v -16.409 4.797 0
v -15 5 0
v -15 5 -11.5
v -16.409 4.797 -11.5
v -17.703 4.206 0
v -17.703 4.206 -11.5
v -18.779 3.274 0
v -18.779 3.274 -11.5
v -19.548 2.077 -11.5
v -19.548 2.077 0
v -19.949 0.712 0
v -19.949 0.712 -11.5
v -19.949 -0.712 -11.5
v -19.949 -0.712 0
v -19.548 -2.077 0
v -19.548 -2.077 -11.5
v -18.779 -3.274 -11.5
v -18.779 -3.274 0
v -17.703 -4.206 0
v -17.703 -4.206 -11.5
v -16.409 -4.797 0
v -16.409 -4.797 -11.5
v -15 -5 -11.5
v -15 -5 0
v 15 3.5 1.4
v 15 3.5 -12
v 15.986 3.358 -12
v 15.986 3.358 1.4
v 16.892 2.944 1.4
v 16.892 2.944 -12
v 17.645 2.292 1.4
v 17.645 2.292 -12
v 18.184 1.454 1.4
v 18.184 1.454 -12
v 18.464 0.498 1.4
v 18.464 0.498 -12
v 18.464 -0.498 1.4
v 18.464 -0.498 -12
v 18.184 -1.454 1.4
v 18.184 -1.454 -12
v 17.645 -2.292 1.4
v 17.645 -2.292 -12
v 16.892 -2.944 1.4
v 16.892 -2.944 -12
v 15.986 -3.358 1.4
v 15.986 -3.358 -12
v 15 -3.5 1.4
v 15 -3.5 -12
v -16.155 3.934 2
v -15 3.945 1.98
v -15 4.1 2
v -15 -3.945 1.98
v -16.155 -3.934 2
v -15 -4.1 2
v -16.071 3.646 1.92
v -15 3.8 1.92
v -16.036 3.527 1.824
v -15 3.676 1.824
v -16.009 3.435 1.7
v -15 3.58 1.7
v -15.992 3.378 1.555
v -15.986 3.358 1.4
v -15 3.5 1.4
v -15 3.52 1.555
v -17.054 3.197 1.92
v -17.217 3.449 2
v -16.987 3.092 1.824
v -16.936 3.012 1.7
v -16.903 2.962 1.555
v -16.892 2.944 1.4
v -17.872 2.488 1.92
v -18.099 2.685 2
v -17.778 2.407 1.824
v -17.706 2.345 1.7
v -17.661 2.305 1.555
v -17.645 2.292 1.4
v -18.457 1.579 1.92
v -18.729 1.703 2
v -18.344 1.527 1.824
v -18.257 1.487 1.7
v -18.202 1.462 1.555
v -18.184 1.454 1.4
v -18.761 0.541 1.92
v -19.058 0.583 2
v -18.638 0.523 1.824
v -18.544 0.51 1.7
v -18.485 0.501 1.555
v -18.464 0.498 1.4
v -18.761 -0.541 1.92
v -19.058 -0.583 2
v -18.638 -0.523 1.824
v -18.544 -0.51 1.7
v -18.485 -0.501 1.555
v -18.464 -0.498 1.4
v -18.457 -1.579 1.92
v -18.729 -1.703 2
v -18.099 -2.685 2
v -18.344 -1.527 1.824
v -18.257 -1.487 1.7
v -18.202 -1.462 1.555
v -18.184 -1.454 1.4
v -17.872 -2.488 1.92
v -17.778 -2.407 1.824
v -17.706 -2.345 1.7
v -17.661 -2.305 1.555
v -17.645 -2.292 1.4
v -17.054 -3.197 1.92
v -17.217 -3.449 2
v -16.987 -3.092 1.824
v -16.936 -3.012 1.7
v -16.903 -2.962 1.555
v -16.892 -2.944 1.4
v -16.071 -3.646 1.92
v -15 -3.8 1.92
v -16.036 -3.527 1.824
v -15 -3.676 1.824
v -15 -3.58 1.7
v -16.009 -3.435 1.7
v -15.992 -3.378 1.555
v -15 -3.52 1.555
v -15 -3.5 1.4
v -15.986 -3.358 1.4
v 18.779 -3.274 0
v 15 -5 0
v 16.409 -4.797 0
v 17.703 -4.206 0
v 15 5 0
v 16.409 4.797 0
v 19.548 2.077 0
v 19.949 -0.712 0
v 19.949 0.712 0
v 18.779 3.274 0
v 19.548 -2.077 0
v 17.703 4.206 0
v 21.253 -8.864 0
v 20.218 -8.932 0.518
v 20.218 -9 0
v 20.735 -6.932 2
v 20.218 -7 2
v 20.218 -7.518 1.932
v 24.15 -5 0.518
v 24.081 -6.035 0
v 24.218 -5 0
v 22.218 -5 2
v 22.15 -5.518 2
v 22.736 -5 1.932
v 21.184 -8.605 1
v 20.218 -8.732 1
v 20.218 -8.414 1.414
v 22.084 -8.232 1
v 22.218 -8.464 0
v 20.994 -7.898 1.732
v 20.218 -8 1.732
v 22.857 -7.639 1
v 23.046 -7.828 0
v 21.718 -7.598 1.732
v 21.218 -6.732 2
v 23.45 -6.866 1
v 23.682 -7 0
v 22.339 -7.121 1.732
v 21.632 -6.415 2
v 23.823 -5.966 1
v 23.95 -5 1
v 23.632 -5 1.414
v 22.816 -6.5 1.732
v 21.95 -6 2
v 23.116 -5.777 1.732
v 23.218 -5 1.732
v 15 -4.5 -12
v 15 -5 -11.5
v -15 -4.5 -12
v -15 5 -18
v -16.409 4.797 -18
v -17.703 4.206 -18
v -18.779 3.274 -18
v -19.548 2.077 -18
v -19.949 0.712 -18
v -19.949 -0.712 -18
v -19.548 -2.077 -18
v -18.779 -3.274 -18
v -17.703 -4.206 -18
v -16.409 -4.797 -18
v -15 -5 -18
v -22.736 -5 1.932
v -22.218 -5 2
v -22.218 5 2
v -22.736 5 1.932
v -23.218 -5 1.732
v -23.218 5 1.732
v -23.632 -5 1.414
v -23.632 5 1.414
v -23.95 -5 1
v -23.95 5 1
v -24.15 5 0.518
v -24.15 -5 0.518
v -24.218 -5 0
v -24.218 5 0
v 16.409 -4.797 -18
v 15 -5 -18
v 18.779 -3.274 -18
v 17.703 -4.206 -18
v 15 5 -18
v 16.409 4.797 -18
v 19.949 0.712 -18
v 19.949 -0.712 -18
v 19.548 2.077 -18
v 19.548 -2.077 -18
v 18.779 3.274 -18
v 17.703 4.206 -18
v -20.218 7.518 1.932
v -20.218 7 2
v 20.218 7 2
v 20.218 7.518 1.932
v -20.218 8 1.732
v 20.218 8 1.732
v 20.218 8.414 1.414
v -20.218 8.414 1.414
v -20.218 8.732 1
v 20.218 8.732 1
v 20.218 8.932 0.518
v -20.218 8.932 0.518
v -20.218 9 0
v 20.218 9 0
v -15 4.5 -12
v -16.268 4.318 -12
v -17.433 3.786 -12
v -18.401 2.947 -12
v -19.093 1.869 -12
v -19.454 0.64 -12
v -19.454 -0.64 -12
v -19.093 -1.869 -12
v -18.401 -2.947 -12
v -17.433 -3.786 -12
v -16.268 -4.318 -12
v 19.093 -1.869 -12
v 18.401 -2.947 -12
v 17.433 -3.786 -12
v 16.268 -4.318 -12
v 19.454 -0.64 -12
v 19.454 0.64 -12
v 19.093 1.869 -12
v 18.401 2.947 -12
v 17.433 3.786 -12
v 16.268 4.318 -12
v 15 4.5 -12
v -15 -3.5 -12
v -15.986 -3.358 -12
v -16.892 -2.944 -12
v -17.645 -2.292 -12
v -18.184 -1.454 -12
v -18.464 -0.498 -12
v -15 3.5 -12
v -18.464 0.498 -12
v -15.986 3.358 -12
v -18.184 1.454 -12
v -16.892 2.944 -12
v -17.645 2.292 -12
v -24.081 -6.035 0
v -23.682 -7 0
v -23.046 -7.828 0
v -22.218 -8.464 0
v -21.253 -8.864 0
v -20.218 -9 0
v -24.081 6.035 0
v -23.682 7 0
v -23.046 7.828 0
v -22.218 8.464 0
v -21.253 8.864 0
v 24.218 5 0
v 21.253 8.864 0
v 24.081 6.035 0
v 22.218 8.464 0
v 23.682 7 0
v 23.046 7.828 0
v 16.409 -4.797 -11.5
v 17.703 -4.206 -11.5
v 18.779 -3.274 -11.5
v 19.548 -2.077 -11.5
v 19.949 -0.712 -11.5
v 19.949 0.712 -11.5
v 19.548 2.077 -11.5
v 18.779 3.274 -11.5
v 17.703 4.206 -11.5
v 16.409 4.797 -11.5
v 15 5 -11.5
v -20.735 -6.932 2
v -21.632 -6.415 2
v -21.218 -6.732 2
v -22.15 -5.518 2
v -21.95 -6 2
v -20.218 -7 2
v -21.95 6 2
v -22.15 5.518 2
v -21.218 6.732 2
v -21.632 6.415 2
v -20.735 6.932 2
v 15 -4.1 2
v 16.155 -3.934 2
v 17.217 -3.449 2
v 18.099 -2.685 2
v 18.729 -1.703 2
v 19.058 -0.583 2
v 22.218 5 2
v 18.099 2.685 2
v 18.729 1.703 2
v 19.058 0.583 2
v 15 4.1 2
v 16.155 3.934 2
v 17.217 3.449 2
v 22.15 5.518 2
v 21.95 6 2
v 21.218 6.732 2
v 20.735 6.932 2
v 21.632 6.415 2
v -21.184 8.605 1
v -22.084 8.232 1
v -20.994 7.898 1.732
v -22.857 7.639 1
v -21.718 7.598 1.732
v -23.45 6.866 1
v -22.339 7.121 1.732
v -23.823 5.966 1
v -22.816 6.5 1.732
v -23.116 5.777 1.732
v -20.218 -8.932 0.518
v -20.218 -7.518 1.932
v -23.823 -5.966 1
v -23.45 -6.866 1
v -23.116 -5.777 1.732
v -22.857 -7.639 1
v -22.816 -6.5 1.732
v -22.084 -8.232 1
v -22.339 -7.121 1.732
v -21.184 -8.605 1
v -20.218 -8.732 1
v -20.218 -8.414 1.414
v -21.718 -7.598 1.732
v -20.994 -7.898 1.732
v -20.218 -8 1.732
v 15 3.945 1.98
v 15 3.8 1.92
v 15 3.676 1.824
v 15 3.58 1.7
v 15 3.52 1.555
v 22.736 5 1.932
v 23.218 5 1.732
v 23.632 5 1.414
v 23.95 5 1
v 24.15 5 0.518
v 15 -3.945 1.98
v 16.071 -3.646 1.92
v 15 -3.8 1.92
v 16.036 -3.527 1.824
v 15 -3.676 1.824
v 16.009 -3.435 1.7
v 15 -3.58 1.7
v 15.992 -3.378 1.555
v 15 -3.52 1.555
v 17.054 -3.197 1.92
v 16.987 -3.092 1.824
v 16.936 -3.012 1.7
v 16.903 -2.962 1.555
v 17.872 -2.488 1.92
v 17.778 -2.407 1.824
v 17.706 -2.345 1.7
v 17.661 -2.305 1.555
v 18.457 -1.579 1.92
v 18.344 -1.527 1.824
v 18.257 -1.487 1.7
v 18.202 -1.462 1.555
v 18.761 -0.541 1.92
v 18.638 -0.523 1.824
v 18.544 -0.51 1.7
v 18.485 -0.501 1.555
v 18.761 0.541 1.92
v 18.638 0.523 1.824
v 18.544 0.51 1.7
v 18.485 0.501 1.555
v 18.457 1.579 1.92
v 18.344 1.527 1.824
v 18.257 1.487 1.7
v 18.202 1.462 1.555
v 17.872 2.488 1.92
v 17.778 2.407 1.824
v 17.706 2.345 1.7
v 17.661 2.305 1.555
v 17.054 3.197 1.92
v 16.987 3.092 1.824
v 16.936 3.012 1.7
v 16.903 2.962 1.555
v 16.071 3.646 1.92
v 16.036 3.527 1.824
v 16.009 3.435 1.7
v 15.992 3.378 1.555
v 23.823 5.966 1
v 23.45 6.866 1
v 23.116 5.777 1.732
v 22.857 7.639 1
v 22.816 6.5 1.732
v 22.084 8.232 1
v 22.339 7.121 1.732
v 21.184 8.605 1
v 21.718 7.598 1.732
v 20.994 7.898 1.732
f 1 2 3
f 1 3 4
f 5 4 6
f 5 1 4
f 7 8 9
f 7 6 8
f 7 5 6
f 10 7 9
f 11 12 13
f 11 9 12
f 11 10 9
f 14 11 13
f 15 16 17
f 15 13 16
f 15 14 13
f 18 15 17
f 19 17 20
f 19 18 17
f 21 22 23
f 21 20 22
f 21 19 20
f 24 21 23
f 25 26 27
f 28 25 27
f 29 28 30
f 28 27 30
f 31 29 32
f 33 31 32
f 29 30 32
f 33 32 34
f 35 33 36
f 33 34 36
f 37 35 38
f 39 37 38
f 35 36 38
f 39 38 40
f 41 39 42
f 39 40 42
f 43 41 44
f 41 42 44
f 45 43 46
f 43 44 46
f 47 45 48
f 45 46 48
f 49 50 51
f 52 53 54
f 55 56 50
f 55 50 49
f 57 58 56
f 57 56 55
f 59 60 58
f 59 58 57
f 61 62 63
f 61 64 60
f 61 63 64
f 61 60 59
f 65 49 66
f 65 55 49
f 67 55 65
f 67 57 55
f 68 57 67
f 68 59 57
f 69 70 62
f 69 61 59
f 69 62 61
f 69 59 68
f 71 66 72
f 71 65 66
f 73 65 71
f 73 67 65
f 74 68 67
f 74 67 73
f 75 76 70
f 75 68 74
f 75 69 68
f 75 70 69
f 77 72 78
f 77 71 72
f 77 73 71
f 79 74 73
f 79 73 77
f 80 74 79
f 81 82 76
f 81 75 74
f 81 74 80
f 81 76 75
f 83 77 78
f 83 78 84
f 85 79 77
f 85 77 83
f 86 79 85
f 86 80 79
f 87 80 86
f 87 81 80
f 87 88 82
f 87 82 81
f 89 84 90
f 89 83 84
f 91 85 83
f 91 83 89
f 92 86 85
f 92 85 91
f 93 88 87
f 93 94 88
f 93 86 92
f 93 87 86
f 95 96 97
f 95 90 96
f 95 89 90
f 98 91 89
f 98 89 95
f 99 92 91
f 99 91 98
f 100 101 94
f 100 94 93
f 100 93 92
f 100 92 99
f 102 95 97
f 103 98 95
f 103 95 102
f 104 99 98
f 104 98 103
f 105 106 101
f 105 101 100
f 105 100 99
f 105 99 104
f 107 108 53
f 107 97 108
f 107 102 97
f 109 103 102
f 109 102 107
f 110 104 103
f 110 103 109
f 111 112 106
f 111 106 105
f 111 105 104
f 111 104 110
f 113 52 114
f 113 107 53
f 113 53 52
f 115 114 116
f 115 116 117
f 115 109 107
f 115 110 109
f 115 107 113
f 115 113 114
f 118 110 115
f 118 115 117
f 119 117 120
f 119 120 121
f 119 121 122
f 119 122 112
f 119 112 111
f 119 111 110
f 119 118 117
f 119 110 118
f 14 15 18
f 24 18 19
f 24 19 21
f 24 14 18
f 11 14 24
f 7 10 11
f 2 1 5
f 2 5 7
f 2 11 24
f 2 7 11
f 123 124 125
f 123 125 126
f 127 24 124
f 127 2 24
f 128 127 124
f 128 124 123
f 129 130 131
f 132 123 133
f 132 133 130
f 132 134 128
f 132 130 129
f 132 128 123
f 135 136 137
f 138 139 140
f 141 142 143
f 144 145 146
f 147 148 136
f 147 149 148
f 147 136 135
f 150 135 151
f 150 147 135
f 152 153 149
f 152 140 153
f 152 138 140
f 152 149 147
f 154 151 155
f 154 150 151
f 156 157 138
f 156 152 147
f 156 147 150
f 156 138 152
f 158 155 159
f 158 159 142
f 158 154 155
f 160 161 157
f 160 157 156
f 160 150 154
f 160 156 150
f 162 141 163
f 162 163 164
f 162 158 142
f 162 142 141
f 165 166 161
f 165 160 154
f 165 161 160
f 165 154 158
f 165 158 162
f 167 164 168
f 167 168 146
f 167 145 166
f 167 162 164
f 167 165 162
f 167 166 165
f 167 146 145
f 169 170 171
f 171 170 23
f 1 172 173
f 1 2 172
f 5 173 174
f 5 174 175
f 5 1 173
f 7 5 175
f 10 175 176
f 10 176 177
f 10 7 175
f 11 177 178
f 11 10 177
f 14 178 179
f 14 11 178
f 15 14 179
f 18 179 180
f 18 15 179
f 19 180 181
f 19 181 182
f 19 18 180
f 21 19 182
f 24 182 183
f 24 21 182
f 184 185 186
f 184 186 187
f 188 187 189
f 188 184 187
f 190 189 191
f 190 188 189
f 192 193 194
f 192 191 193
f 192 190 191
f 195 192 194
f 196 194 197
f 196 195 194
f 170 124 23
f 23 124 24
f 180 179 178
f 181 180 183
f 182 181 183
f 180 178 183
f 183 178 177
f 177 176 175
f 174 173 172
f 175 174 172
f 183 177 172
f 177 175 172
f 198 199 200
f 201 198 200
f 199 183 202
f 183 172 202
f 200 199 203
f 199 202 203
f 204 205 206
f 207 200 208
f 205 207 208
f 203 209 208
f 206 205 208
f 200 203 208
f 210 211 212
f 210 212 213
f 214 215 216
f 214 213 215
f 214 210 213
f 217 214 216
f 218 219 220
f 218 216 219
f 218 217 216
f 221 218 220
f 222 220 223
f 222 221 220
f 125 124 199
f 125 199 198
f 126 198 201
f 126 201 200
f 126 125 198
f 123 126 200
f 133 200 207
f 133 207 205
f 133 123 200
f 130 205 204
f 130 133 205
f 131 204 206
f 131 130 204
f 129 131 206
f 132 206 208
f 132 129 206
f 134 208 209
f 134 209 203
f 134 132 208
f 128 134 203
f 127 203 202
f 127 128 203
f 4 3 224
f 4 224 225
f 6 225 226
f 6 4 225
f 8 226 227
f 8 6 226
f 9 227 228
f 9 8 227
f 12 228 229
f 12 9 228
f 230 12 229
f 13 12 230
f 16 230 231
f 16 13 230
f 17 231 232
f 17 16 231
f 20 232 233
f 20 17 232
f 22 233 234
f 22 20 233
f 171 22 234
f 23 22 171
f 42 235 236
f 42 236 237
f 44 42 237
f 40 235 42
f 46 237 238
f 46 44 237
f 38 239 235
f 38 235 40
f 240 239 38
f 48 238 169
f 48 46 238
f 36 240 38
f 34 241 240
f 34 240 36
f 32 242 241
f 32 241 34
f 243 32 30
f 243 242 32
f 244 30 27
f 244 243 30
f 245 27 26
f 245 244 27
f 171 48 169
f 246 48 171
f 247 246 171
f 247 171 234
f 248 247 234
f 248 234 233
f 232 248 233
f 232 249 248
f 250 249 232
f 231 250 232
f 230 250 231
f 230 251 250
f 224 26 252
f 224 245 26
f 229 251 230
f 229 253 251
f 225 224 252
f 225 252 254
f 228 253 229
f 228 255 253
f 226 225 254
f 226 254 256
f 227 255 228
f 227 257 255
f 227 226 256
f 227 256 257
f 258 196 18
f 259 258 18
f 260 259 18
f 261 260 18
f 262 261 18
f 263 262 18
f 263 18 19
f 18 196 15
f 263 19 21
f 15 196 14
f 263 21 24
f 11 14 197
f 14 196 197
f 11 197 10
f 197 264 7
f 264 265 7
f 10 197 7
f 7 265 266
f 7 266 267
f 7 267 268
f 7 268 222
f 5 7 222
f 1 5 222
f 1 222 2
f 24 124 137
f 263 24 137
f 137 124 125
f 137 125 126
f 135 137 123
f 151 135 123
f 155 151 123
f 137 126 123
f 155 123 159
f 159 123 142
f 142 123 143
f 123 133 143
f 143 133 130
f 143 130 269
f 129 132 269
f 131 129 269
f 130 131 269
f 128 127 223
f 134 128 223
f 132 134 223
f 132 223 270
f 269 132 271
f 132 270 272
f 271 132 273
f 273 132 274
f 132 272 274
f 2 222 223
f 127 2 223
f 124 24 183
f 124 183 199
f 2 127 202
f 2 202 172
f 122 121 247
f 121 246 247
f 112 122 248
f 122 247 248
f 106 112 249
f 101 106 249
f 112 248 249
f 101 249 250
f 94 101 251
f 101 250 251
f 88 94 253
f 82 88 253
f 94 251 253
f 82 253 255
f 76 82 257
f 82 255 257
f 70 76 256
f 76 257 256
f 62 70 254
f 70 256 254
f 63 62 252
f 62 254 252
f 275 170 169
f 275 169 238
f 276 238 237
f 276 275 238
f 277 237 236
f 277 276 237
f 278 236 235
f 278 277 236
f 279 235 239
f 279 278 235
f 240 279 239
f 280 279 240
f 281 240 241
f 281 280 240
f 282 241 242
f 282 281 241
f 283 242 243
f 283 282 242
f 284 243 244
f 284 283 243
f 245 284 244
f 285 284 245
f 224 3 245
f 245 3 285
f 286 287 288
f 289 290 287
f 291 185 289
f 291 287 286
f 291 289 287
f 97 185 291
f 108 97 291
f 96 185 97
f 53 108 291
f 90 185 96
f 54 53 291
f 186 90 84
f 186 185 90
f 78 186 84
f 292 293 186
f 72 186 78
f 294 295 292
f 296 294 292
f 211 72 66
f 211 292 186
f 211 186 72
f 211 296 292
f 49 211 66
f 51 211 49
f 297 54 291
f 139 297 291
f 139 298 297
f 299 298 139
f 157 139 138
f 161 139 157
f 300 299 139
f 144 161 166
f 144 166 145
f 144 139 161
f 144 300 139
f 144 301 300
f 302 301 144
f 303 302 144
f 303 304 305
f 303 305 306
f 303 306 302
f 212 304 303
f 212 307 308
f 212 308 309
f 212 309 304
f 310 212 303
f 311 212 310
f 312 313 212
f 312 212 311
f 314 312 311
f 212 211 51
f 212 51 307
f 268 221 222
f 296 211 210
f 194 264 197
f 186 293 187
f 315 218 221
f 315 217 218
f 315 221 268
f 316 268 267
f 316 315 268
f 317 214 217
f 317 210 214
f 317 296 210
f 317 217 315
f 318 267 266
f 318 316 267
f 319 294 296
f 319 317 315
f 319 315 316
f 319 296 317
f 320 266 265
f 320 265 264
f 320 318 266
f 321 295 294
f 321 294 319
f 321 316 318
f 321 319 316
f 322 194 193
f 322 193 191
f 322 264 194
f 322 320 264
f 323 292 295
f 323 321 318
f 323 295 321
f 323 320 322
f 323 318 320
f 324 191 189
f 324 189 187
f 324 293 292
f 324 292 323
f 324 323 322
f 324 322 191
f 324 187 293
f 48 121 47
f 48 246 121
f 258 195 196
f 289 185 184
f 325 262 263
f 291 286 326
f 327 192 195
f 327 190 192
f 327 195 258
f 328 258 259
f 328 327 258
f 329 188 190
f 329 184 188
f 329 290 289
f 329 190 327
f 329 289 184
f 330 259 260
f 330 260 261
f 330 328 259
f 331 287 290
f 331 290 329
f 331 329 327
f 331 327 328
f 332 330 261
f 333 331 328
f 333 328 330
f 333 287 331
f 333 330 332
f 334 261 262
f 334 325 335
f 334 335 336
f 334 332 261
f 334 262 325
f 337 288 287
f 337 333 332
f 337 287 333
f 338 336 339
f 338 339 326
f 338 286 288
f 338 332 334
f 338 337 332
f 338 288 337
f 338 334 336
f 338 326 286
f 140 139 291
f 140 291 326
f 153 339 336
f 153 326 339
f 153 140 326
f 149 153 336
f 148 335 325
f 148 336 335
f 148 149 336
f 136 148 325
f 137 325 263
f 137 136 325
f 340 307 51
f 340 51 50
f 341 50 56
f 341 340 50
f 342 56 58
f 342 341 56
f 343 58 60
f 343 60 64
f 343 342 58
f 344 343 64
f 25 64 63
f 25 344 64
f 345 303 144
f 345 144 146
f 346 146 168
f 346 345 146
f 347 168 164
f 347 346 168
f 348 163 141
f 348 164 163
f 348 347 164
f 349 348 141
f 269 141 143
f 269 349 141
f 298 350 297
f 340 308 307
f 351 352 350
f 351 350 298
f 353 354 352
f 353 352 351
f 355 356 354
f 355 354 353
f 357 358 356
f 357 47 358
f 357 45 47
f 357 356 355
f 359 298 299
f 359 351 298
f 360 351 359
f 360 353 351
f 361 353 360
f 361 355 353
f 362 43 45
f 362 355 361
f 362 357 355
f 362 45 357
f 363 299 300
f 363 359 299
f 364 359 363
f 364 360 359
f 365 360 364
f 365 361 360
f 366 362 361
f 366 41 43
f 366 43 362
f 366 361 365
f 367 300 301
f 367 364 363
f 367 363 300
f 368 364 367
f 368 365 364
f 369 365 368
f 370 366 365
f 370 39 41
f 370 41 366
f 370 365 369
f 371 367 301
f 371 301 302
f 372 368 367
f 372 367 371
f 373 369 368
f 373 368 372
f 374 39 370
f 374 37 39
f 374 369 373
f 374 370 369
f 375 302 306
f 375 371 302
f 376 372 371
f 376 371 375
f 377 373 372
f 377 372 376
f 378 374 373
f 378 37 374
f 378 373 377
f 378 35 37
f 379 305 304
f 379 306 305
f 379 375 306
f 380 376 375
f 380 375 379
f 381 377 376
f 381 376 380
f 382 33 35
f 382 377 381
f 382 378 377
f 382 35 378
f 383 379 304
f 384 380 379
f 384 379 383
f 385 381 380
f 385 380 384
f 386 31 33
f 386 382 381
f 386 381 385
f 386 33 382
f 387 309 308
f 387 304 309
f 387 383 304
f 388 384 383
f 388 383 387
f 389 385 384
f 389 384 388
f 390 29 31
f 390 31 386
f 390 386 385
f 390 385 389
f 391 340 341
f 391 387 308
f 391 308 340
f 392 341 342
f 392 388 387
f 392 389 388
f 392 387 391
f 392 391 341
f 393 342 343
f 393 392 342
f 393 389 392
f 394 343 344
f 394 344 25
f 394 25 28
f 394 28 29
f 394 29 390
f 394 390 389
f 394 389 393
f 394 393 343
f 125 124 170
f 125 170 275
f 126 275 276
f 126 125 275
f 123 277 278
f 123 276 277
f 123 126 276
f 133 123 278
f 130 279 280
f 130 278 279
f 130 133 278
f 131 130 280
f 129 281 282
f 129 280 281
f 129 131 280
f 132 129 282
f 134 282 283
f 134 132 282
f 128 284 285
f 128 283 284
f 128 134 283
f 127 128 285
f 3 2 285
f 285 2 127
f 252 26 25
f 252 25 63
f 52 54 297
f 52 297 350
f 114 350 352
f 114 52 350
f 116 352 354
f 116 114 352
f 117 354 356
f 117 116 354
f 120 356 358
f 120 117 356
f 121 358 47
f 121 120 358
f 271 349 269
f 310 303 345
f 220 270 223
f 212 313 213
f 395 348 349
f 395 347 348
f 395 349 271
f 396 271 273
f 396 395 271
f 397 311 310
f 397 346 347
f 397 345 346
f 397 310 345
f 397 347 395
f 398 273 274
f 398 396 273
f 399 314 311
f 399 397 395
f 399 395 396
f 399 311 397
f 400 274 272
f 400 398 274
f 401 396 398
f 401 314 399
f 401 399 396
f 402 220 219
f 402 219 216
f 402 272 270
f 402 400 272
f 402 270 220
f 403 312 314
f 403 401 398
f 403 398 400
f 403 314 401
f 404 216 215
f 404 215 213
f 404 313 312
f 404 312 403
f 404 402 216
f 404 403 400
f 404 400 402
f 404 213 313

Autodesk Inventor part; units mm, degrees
ref_plane "YZ Plane" through (0, 0, 0) normal (1, 0, 0) x (0, 1, 0)
ref_plane "XZ Plane" through (0, 0, 0) normal (0, 1, 0) x (-1, 0, 0)
ref_plane "XY Plane" through (0, 0, 0) normal (0, 0, 1) x (1, 0, 0)
sketch "Sketch1" plane through (0, 0, 0) normal (0, 0, 1) x (1, 0, 0)
  line L0 (-15, 0) -> (15, 0) construction
  line L1 (-15, -5) -> (15, -5)
  line L2 (15, 5) -> (-15, 5)
  arc A0 (-15, 5) -> (-15, -5) centre (-15, 0) ccw
  arc A1 (15, -5) -> (15, 5) centre (15, 0) ccw
  line L3 (-20, -5) -> (20, -5) construction
  line L4 (20, -5) -> (20, 5) construction
  line L5 (20, 5) -> (-20, 5) construction
  line L6 (-20, 5) -> (-20, -5) construction
  line L7 (-20, -5) -> (20, 5) construction
  line L8 (20, -5) -> (-20, 5) construction
  point P0 (0, 0)
  dimension "d1" = 10
  dimension "Length" = 40
extrude "Extrusion1" add sketch "Sketch1" against normal blind 18
sketch "Sketch2" plane through (0, 0, 0) normal (0, 0, 1) x (1, 0, 0)
  line L0 (-24.2177, -9) -> (24.2177, -9)
  line L1 (24.2177, -9) -> (24.2177, 9)
  line L2 (24.2177, 9) -> (-24.2177, 9)
  line L3 (-24.2177, 9) -> (-24.2177, -9)
  line L4 (-24.2177, -9) -> (24.2177, 9) construction
  line L5 (24.2177, -9) -> (-24.2177, 9) construction
  line L6 (15, 5) -> (-15, 5) projected
  line L7 (-20, 5.8694) -> (-20, -5.995) construction
  arc A0 (-15, 5) -> (-15, -5) centre (-15, 0) ccw projected
  point P0 (0, 0)
  dimension "d4" = 4
  dimension "d5" = 4.2177
extrude "Extrusion2" add sketch "Sketch2" along normal blind 2 separate body
sketch "Sketch3" plane through (0, 0, 0) normal (0, 0, -1) x (-1, 0, 0)
  arc A0 (-15, 5) -> (-15, -5) centre (-15, 0) ccw projected
  line L0 (-15, -5) -> (15, -5) projected
  arc A1 (15, -5) -> (15, 5) centre (15, 0) ccw projected
  line L1 (15, 5) -> (-15, 5) projected
  point P0 (0, 0)
extrude "Extrusion3" add sketch "Sketch3" along normal blind 12 bodies 2
sketch "Sketch4" plane through (0, 0, -12) normal (0, 0, -1) x (-1, 0, 0)
  line L0 (-15, -5) -> (15, -5) projected
  arc A0 (15, -5) -> (15, 5) centre (15, 0) ccw projected
  line L1 (15, 5) -> (-15, 5) projected
  arc A1 (-15, 5) -> (-15, -5) centre (-15, 0) ccw projected
  line L2 (15, -3.5) -> (-15, -3.5)
  arc A2 (-15, 3.5) -> (-15, -3.5) centre (-15, 0) ccw
  line L3 (-15, 3.5) -> (15, 3.5)
  arc A3 (15, -3.5) -> (15, 3.5) centre (15, 0) ccw
  point P0 (0, 0)
  dimension "d10" = 1.5
extrude "Extrusion4" cut sketch "Sketch4" against normal through all contours L2 A2 L3 A3 bodies 2
fillet "Fillet1" radius 4 4 edges at (-24.2177, -9, 1) (-24.2177, 9, 1) (24.2177, -9, 1) (24.2177, 9, 1)
fillet "Fillet2" radius 2 8 edges at (-23.0462, -7.8284, 2) (0, -9, 2) (23.0462, -7.8284, 2) (24.2177, 0, 2) (23.0462, 7.8284, 2) (0, 9, 2) (-23.0462, 7.8284, 2) (-24.2177, 0, 2)
fillet "Fillet3" radius 0.6 4 edges at (18.5, 0, 2) (0, -3.5, 2) (-18.5, 0, 2) (0, 3.5, 2)
chamfer "Chamfer1" distance 0.5 angle 45 4 edges at (0, -5, -12) (-20, 0, -12) (0, 5, -12) (20, 0, -12)
sketch "Sketch5" plane through (0, 0, -18) normal (0, 0, -1) x (-1, 0, 0)
  point P0 (0, 0)
properties part number "Aisle L40" material "Aluminum 6061-AHC"
